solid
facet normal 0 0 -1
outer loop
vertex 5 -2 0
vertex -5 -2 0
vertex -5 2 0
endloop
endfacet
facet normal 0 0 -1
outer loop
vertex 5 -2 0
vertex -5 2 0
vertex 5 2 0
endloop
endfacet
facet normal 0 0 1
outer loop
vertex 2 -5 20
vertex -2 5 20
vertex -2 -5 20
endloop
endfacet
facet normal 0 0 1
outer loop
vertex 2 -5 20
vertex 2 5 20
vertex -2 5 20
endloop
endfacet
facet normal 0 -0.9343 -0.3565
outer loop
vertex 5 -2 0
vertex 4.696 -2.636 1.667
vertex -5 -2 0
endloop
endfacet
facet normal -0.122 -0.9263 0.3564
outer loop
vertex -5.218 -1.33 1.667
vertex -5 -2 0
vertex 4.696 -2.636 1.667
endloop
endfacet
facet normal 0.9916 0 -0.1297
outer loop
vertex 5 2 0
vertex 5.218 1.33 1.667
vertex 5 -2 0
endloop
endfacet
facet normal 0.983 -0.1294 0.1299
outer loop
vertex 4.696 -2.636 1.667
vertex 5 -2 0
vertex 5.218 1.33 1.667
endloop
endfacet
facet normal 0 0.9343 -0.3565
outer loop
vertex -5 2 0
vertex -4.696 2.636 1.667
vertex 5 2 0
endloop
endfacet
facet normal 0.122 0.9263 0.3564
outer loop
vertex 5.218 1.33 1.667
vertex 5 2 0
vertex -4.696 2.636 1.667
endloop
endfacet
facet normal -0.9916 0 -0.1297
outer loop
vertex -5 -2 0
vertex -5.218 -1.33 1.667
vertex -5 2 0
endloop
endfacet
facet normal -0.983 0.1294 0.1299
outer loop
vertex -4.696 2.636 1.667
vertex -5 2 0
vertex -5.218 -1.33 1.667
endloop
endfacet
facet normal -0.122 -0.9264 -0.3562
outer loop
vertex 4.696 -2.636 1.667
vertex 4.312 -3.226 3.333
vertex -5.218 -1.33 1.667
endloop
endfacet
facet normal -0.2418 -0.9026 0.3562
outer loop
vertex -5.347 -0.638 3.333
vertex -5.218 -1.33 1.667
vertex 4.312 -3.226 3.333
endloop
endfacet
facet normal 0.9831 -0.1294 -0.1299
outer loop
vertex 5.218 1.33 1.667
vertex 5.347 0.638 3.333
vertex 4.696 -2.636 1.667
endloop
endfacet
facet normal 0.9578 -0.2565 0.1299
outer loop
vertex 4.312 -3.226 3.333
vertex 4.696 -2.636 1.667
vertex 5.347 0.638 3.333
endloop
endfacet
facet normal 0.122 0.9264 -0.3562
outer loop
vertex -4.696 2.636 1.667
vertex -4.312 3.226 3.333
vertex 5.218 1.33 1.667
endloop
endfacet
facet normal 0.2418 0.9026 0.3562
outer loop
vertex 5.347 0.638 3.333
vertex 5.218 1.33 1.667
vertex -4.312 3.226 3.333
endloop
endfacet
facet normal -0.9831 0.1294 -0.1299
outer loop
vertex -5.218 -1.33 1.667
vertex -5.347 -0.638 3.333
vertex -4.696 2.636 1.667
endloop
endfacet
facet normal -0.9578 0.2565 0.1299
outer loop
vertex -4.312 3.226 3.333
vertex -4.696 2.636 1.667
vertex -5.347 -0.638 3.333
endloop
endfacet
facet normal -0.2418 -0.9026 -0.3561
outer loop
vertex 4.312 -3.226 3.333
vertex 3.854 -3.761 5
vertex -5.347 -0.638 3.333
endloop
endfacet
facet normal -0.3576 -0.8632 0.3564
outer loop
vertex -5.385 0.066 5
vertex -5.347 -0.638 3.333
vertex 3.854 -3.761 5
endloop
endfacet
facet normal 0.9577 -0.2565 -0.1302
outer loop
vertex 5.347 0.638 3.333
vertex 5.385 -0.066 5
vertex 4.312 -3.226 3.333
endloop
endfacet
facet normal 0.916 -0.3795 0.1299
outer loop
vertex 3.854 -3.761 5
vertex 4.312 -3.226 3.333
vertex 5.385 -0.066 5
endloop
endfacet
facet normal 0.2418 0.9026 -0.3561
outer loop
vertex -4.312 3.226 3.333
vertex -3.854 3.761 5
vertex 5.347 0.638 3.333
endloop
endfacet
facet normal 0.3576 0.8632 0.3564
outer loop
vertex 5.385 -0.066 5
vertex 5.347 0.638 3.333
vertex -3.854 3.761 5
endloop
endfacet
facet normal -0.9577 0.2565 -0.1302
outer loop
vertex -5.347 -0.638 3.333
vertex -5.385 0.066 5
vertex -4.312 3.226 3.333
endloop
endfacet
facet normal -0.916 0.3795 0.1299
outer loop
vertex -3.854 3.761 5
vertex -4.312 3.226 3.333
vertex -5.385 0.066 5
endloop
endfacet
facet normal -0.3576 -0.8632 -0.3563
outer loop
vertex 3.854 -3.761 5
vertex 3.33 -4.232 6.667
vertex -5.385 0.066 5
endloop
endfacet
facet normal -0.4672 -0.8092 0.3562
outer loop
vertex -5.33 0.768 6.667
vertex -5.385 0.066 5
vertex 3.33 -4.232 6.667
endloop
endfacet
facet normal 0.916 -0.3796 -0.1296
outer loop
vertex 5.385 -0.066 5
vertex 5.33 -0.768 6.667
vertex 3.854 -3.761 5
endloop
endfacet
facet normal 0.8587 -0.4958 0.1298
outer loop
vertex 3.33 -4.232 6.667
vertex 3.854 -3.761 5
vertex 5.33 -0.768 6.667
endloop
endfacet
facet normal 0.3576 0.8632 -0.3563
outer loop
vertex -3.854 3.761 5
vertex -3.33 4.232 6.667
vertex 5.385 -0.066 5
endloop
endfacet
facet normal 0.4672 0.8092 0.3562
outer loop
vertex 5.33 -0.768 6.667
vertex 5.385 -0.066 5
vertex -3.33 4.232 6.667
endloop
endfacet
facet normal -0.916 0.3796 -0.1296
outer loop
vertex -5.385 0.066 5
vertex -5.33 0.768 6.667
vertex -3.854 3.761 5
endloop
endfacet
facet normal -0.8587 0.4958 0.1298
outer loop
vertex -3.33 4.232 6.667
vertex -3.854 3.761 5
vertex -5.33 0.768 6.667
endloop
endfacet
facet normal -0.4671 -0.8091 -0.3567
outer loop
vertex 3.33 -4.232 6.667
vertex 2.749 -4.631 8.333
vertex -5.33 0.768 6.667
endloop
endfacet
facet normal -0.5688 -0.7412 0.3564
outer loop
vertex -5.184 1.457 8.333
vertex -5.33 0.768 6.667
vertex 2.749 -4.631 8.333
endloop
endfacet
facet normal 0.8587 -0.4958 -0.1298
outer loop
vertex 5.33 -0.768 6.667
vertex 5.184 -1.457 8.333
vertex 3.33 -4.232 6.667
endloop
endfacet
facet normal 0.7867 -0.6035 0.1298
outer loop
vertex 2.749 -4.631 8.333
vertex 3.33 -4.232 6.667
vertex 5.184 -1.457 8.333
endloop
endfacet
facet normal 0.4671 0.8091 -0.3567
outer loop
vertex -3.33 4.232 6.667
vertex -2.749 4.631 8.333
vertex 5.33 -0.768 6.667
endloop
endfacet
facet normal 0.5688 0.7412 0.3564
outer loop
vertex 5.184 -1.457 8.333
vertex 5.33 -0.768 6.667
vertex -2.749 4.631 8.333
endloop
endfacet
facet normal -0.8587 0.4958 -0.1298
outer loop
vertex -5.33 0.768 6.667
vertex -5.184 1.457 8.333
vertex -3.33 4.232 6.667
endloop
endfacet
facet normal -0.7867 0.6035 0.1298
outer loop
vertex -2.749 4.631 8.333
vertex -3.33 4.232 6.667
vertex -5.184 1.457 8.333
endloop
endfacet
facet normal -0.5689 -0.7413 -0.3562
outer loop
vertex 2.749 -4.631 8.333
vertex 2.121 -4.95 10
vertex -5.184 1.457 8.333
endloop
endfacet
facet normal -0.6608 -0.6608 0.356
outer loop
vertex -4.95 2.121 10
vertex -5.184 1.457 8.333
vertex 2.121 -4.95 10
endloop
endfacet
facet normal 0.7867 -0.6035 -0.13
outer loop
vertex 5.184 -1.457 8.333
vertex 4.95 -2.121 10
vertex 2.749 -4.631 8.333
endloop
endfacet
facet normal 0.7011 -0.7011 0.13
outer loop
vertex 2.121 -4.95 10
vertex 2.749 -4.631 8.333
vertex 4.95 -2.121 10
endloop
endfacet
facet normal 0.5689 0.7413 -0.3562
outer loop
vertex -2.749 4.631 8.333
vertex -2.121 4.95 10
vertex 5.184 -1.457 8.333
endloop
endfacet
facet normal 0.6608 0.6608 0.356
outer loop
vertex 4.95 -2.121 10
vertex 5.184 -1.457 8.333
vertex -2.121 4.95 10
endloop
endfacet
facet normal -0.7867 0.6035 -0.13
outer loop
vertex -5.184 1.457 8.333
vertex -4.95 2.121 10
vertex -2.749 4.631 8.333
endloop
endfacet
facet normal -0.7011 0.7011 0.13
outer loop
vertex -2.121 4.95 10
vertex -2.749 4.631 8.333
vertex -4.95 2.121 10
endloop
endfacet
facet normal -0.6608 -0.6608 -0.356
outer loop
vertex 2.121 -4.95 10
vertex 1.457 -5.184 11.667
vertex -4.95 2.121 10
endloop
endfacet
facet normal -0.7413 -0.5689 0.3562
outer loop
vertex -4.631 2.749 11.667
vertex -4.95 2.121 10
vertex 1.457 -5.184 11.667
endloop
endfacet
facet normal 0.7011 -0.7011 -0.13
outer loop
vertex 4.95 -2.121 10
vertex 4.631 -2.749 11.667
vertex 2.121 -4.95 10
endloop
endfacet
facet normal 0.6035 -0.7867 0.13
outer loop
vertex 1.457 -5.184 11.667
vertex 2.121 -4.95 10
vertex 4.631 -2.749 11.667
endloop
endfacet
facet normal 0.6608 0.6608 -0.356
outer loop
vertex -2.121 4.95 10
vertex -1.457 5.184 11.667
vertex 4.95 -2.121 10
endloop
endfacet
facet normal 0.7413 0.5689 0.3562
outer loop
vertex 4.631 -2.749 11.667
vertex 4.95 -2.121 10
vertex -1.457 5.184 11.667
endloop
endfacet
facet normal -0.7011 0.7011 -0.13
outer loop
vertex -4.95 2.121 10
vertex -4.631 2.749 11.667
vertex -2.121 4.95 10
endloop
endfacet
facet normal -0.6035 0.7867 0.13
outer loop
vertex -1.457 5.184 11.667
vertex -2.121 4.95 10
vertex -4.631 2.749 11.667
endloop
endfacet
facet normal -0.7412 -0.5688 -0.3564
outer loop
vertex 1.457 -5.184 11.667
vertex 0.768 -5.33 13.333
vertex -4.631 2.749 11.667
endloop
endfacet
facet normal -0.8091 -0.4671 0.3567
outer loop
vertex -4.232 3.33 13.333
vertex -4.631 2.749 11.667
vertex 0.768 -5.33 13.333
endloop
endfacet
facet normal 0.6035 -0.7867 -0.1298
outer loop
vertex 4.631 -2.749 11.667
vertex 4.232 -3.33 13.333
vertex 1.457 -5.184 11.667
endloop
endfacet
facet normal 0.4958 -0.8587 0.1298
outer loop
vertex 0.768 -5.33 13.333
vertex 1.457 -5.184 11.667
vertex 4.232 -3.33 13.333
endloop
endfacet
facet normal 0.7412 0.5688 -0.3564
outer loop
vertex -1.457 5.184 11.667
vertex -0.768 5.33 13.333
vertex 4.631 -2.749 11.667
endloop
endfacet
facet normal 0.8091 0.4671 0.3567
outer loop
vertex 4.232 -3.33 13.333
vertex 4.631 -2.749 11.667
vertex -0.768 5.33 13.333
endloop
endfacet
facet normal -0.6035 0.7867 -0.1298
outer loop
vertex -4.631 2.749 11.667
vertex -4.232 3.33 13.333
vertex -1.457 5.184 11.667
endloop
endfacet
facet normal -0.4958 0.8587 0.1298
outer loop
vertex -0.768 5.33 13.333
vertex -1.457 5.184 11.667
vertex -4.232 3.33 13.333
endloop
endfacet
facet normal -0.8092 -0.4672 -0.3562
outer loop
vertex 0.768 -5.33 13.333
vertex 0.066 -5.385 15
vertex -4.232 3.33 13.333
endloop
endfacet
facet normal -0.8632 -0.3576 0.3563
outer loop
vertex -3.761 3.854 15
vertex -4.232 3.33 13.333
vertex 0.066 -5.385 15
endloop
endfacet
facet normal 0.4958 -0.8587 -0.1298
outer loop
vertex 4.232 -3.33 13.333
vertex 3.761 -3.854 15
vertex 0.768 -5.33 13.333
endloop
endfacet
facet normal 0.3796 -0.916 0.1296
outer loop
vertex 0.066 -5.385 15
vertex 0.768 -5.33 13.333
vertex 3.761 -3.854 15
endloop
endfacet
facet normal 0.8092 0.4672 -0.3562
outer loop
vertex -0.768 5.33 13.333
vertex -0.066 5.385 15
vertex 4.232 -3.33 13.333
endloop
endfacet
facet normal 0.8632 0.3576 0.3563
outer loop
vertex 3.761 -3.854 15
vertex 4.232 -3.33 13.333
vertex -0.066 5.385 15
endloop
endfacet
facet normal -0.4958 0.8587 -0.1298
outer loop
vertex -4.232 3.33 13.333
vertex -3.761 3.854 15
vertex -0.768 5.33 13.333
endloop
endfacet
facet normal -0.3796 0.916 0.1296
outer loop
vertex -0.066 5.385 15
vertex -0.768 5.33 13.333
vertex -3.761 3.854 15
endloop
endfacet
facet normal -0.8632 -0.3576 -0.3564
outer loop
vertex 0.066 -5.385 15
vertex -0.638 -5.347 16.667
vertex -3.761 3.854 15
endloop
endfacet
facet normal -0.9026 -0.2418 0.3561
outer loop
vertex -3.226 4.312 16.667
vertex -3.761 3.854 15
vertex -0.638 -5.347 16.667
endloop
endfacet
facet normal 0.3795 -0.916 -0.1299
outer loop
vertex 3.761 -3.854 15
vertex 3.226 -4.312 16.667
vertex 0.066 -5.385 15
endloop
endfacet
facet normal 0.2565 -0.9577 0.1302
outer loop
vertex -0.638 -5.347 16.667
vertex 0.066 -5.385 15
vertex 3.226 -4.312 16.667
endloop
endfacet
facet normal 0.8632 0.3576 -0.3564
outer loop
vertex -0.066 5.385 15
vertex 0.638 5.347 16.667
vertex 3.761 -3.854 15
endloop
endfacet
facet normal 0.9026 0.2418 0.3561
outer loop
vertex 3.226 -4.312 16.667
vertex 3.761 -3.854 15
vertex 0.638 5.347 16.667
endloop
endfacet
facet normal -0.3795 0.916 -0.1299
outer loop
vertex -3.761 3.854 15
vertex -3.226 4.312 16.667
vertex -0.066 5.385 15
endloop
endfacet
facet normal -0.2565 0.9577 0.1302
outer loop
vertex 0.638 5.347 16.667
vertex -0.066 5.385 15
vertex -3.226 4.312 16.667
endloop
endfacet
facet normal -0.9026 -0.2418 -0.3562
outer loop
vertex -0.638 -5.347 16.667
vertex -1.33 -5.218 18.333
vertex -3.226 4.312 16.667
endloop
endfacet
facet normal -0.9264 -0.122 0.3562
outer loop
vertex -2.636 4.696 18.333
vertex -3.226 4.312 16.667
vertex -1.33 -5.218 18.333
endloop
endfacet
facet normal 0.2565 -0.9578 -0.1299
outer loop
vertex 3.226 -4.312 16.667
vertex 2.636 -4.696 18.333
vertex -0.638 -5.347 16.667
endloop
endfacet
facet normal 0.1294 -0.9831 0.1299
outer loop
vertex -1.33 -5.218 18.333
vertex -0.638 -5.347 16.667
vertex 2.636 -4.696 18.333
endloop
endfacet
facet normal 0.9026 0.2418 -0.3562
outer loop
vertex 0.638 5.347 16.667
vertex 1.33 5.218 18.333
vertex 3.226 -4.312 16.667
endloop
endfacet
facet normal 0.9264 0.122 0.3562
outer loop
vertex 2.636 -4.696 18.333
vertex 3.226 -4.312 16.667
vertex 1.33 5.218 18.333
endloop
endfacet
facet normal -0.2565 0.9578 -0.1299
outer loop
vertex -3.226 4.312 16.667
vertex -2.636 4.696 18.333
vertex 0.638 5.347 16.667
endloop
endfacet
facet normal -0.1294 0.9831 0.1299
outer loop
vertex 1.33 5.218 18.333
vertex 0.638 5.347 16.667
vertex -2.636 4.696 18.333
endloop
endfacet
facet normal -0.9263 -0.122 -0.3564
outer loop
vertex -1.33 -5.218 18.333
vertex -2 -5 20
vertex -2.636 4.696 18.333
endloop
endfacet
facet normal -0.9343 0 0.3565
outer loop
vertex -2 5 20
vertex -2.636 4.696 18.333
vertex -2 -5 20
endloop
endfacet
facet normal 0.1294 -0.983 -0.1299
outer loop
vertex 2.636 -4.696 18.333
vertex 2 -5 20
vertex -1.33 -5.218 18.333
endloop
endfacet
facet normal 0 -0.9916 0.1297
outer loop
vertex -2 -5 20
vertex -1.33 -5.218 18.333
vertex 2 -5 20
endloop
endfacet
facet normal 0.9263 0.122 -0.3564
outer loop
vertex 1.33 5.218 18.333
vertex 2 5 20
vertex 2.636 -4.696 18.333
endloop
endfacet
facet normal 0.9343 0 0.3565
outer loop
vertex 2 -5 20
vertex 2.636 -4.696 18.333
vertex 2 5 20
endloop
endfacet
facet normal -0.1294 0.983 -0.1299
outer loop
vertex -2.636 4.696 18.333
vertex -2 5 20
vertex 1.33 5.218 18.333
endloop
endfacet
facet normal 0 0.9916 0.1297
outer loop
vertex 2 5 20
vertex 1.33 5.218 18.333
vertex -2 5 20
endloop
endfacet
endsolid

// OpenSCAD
// Construct: linear_extrude() with twist.
linear_extrude(height = 20, twist = 90, $fn = 48) square([10, 4], center = true);
